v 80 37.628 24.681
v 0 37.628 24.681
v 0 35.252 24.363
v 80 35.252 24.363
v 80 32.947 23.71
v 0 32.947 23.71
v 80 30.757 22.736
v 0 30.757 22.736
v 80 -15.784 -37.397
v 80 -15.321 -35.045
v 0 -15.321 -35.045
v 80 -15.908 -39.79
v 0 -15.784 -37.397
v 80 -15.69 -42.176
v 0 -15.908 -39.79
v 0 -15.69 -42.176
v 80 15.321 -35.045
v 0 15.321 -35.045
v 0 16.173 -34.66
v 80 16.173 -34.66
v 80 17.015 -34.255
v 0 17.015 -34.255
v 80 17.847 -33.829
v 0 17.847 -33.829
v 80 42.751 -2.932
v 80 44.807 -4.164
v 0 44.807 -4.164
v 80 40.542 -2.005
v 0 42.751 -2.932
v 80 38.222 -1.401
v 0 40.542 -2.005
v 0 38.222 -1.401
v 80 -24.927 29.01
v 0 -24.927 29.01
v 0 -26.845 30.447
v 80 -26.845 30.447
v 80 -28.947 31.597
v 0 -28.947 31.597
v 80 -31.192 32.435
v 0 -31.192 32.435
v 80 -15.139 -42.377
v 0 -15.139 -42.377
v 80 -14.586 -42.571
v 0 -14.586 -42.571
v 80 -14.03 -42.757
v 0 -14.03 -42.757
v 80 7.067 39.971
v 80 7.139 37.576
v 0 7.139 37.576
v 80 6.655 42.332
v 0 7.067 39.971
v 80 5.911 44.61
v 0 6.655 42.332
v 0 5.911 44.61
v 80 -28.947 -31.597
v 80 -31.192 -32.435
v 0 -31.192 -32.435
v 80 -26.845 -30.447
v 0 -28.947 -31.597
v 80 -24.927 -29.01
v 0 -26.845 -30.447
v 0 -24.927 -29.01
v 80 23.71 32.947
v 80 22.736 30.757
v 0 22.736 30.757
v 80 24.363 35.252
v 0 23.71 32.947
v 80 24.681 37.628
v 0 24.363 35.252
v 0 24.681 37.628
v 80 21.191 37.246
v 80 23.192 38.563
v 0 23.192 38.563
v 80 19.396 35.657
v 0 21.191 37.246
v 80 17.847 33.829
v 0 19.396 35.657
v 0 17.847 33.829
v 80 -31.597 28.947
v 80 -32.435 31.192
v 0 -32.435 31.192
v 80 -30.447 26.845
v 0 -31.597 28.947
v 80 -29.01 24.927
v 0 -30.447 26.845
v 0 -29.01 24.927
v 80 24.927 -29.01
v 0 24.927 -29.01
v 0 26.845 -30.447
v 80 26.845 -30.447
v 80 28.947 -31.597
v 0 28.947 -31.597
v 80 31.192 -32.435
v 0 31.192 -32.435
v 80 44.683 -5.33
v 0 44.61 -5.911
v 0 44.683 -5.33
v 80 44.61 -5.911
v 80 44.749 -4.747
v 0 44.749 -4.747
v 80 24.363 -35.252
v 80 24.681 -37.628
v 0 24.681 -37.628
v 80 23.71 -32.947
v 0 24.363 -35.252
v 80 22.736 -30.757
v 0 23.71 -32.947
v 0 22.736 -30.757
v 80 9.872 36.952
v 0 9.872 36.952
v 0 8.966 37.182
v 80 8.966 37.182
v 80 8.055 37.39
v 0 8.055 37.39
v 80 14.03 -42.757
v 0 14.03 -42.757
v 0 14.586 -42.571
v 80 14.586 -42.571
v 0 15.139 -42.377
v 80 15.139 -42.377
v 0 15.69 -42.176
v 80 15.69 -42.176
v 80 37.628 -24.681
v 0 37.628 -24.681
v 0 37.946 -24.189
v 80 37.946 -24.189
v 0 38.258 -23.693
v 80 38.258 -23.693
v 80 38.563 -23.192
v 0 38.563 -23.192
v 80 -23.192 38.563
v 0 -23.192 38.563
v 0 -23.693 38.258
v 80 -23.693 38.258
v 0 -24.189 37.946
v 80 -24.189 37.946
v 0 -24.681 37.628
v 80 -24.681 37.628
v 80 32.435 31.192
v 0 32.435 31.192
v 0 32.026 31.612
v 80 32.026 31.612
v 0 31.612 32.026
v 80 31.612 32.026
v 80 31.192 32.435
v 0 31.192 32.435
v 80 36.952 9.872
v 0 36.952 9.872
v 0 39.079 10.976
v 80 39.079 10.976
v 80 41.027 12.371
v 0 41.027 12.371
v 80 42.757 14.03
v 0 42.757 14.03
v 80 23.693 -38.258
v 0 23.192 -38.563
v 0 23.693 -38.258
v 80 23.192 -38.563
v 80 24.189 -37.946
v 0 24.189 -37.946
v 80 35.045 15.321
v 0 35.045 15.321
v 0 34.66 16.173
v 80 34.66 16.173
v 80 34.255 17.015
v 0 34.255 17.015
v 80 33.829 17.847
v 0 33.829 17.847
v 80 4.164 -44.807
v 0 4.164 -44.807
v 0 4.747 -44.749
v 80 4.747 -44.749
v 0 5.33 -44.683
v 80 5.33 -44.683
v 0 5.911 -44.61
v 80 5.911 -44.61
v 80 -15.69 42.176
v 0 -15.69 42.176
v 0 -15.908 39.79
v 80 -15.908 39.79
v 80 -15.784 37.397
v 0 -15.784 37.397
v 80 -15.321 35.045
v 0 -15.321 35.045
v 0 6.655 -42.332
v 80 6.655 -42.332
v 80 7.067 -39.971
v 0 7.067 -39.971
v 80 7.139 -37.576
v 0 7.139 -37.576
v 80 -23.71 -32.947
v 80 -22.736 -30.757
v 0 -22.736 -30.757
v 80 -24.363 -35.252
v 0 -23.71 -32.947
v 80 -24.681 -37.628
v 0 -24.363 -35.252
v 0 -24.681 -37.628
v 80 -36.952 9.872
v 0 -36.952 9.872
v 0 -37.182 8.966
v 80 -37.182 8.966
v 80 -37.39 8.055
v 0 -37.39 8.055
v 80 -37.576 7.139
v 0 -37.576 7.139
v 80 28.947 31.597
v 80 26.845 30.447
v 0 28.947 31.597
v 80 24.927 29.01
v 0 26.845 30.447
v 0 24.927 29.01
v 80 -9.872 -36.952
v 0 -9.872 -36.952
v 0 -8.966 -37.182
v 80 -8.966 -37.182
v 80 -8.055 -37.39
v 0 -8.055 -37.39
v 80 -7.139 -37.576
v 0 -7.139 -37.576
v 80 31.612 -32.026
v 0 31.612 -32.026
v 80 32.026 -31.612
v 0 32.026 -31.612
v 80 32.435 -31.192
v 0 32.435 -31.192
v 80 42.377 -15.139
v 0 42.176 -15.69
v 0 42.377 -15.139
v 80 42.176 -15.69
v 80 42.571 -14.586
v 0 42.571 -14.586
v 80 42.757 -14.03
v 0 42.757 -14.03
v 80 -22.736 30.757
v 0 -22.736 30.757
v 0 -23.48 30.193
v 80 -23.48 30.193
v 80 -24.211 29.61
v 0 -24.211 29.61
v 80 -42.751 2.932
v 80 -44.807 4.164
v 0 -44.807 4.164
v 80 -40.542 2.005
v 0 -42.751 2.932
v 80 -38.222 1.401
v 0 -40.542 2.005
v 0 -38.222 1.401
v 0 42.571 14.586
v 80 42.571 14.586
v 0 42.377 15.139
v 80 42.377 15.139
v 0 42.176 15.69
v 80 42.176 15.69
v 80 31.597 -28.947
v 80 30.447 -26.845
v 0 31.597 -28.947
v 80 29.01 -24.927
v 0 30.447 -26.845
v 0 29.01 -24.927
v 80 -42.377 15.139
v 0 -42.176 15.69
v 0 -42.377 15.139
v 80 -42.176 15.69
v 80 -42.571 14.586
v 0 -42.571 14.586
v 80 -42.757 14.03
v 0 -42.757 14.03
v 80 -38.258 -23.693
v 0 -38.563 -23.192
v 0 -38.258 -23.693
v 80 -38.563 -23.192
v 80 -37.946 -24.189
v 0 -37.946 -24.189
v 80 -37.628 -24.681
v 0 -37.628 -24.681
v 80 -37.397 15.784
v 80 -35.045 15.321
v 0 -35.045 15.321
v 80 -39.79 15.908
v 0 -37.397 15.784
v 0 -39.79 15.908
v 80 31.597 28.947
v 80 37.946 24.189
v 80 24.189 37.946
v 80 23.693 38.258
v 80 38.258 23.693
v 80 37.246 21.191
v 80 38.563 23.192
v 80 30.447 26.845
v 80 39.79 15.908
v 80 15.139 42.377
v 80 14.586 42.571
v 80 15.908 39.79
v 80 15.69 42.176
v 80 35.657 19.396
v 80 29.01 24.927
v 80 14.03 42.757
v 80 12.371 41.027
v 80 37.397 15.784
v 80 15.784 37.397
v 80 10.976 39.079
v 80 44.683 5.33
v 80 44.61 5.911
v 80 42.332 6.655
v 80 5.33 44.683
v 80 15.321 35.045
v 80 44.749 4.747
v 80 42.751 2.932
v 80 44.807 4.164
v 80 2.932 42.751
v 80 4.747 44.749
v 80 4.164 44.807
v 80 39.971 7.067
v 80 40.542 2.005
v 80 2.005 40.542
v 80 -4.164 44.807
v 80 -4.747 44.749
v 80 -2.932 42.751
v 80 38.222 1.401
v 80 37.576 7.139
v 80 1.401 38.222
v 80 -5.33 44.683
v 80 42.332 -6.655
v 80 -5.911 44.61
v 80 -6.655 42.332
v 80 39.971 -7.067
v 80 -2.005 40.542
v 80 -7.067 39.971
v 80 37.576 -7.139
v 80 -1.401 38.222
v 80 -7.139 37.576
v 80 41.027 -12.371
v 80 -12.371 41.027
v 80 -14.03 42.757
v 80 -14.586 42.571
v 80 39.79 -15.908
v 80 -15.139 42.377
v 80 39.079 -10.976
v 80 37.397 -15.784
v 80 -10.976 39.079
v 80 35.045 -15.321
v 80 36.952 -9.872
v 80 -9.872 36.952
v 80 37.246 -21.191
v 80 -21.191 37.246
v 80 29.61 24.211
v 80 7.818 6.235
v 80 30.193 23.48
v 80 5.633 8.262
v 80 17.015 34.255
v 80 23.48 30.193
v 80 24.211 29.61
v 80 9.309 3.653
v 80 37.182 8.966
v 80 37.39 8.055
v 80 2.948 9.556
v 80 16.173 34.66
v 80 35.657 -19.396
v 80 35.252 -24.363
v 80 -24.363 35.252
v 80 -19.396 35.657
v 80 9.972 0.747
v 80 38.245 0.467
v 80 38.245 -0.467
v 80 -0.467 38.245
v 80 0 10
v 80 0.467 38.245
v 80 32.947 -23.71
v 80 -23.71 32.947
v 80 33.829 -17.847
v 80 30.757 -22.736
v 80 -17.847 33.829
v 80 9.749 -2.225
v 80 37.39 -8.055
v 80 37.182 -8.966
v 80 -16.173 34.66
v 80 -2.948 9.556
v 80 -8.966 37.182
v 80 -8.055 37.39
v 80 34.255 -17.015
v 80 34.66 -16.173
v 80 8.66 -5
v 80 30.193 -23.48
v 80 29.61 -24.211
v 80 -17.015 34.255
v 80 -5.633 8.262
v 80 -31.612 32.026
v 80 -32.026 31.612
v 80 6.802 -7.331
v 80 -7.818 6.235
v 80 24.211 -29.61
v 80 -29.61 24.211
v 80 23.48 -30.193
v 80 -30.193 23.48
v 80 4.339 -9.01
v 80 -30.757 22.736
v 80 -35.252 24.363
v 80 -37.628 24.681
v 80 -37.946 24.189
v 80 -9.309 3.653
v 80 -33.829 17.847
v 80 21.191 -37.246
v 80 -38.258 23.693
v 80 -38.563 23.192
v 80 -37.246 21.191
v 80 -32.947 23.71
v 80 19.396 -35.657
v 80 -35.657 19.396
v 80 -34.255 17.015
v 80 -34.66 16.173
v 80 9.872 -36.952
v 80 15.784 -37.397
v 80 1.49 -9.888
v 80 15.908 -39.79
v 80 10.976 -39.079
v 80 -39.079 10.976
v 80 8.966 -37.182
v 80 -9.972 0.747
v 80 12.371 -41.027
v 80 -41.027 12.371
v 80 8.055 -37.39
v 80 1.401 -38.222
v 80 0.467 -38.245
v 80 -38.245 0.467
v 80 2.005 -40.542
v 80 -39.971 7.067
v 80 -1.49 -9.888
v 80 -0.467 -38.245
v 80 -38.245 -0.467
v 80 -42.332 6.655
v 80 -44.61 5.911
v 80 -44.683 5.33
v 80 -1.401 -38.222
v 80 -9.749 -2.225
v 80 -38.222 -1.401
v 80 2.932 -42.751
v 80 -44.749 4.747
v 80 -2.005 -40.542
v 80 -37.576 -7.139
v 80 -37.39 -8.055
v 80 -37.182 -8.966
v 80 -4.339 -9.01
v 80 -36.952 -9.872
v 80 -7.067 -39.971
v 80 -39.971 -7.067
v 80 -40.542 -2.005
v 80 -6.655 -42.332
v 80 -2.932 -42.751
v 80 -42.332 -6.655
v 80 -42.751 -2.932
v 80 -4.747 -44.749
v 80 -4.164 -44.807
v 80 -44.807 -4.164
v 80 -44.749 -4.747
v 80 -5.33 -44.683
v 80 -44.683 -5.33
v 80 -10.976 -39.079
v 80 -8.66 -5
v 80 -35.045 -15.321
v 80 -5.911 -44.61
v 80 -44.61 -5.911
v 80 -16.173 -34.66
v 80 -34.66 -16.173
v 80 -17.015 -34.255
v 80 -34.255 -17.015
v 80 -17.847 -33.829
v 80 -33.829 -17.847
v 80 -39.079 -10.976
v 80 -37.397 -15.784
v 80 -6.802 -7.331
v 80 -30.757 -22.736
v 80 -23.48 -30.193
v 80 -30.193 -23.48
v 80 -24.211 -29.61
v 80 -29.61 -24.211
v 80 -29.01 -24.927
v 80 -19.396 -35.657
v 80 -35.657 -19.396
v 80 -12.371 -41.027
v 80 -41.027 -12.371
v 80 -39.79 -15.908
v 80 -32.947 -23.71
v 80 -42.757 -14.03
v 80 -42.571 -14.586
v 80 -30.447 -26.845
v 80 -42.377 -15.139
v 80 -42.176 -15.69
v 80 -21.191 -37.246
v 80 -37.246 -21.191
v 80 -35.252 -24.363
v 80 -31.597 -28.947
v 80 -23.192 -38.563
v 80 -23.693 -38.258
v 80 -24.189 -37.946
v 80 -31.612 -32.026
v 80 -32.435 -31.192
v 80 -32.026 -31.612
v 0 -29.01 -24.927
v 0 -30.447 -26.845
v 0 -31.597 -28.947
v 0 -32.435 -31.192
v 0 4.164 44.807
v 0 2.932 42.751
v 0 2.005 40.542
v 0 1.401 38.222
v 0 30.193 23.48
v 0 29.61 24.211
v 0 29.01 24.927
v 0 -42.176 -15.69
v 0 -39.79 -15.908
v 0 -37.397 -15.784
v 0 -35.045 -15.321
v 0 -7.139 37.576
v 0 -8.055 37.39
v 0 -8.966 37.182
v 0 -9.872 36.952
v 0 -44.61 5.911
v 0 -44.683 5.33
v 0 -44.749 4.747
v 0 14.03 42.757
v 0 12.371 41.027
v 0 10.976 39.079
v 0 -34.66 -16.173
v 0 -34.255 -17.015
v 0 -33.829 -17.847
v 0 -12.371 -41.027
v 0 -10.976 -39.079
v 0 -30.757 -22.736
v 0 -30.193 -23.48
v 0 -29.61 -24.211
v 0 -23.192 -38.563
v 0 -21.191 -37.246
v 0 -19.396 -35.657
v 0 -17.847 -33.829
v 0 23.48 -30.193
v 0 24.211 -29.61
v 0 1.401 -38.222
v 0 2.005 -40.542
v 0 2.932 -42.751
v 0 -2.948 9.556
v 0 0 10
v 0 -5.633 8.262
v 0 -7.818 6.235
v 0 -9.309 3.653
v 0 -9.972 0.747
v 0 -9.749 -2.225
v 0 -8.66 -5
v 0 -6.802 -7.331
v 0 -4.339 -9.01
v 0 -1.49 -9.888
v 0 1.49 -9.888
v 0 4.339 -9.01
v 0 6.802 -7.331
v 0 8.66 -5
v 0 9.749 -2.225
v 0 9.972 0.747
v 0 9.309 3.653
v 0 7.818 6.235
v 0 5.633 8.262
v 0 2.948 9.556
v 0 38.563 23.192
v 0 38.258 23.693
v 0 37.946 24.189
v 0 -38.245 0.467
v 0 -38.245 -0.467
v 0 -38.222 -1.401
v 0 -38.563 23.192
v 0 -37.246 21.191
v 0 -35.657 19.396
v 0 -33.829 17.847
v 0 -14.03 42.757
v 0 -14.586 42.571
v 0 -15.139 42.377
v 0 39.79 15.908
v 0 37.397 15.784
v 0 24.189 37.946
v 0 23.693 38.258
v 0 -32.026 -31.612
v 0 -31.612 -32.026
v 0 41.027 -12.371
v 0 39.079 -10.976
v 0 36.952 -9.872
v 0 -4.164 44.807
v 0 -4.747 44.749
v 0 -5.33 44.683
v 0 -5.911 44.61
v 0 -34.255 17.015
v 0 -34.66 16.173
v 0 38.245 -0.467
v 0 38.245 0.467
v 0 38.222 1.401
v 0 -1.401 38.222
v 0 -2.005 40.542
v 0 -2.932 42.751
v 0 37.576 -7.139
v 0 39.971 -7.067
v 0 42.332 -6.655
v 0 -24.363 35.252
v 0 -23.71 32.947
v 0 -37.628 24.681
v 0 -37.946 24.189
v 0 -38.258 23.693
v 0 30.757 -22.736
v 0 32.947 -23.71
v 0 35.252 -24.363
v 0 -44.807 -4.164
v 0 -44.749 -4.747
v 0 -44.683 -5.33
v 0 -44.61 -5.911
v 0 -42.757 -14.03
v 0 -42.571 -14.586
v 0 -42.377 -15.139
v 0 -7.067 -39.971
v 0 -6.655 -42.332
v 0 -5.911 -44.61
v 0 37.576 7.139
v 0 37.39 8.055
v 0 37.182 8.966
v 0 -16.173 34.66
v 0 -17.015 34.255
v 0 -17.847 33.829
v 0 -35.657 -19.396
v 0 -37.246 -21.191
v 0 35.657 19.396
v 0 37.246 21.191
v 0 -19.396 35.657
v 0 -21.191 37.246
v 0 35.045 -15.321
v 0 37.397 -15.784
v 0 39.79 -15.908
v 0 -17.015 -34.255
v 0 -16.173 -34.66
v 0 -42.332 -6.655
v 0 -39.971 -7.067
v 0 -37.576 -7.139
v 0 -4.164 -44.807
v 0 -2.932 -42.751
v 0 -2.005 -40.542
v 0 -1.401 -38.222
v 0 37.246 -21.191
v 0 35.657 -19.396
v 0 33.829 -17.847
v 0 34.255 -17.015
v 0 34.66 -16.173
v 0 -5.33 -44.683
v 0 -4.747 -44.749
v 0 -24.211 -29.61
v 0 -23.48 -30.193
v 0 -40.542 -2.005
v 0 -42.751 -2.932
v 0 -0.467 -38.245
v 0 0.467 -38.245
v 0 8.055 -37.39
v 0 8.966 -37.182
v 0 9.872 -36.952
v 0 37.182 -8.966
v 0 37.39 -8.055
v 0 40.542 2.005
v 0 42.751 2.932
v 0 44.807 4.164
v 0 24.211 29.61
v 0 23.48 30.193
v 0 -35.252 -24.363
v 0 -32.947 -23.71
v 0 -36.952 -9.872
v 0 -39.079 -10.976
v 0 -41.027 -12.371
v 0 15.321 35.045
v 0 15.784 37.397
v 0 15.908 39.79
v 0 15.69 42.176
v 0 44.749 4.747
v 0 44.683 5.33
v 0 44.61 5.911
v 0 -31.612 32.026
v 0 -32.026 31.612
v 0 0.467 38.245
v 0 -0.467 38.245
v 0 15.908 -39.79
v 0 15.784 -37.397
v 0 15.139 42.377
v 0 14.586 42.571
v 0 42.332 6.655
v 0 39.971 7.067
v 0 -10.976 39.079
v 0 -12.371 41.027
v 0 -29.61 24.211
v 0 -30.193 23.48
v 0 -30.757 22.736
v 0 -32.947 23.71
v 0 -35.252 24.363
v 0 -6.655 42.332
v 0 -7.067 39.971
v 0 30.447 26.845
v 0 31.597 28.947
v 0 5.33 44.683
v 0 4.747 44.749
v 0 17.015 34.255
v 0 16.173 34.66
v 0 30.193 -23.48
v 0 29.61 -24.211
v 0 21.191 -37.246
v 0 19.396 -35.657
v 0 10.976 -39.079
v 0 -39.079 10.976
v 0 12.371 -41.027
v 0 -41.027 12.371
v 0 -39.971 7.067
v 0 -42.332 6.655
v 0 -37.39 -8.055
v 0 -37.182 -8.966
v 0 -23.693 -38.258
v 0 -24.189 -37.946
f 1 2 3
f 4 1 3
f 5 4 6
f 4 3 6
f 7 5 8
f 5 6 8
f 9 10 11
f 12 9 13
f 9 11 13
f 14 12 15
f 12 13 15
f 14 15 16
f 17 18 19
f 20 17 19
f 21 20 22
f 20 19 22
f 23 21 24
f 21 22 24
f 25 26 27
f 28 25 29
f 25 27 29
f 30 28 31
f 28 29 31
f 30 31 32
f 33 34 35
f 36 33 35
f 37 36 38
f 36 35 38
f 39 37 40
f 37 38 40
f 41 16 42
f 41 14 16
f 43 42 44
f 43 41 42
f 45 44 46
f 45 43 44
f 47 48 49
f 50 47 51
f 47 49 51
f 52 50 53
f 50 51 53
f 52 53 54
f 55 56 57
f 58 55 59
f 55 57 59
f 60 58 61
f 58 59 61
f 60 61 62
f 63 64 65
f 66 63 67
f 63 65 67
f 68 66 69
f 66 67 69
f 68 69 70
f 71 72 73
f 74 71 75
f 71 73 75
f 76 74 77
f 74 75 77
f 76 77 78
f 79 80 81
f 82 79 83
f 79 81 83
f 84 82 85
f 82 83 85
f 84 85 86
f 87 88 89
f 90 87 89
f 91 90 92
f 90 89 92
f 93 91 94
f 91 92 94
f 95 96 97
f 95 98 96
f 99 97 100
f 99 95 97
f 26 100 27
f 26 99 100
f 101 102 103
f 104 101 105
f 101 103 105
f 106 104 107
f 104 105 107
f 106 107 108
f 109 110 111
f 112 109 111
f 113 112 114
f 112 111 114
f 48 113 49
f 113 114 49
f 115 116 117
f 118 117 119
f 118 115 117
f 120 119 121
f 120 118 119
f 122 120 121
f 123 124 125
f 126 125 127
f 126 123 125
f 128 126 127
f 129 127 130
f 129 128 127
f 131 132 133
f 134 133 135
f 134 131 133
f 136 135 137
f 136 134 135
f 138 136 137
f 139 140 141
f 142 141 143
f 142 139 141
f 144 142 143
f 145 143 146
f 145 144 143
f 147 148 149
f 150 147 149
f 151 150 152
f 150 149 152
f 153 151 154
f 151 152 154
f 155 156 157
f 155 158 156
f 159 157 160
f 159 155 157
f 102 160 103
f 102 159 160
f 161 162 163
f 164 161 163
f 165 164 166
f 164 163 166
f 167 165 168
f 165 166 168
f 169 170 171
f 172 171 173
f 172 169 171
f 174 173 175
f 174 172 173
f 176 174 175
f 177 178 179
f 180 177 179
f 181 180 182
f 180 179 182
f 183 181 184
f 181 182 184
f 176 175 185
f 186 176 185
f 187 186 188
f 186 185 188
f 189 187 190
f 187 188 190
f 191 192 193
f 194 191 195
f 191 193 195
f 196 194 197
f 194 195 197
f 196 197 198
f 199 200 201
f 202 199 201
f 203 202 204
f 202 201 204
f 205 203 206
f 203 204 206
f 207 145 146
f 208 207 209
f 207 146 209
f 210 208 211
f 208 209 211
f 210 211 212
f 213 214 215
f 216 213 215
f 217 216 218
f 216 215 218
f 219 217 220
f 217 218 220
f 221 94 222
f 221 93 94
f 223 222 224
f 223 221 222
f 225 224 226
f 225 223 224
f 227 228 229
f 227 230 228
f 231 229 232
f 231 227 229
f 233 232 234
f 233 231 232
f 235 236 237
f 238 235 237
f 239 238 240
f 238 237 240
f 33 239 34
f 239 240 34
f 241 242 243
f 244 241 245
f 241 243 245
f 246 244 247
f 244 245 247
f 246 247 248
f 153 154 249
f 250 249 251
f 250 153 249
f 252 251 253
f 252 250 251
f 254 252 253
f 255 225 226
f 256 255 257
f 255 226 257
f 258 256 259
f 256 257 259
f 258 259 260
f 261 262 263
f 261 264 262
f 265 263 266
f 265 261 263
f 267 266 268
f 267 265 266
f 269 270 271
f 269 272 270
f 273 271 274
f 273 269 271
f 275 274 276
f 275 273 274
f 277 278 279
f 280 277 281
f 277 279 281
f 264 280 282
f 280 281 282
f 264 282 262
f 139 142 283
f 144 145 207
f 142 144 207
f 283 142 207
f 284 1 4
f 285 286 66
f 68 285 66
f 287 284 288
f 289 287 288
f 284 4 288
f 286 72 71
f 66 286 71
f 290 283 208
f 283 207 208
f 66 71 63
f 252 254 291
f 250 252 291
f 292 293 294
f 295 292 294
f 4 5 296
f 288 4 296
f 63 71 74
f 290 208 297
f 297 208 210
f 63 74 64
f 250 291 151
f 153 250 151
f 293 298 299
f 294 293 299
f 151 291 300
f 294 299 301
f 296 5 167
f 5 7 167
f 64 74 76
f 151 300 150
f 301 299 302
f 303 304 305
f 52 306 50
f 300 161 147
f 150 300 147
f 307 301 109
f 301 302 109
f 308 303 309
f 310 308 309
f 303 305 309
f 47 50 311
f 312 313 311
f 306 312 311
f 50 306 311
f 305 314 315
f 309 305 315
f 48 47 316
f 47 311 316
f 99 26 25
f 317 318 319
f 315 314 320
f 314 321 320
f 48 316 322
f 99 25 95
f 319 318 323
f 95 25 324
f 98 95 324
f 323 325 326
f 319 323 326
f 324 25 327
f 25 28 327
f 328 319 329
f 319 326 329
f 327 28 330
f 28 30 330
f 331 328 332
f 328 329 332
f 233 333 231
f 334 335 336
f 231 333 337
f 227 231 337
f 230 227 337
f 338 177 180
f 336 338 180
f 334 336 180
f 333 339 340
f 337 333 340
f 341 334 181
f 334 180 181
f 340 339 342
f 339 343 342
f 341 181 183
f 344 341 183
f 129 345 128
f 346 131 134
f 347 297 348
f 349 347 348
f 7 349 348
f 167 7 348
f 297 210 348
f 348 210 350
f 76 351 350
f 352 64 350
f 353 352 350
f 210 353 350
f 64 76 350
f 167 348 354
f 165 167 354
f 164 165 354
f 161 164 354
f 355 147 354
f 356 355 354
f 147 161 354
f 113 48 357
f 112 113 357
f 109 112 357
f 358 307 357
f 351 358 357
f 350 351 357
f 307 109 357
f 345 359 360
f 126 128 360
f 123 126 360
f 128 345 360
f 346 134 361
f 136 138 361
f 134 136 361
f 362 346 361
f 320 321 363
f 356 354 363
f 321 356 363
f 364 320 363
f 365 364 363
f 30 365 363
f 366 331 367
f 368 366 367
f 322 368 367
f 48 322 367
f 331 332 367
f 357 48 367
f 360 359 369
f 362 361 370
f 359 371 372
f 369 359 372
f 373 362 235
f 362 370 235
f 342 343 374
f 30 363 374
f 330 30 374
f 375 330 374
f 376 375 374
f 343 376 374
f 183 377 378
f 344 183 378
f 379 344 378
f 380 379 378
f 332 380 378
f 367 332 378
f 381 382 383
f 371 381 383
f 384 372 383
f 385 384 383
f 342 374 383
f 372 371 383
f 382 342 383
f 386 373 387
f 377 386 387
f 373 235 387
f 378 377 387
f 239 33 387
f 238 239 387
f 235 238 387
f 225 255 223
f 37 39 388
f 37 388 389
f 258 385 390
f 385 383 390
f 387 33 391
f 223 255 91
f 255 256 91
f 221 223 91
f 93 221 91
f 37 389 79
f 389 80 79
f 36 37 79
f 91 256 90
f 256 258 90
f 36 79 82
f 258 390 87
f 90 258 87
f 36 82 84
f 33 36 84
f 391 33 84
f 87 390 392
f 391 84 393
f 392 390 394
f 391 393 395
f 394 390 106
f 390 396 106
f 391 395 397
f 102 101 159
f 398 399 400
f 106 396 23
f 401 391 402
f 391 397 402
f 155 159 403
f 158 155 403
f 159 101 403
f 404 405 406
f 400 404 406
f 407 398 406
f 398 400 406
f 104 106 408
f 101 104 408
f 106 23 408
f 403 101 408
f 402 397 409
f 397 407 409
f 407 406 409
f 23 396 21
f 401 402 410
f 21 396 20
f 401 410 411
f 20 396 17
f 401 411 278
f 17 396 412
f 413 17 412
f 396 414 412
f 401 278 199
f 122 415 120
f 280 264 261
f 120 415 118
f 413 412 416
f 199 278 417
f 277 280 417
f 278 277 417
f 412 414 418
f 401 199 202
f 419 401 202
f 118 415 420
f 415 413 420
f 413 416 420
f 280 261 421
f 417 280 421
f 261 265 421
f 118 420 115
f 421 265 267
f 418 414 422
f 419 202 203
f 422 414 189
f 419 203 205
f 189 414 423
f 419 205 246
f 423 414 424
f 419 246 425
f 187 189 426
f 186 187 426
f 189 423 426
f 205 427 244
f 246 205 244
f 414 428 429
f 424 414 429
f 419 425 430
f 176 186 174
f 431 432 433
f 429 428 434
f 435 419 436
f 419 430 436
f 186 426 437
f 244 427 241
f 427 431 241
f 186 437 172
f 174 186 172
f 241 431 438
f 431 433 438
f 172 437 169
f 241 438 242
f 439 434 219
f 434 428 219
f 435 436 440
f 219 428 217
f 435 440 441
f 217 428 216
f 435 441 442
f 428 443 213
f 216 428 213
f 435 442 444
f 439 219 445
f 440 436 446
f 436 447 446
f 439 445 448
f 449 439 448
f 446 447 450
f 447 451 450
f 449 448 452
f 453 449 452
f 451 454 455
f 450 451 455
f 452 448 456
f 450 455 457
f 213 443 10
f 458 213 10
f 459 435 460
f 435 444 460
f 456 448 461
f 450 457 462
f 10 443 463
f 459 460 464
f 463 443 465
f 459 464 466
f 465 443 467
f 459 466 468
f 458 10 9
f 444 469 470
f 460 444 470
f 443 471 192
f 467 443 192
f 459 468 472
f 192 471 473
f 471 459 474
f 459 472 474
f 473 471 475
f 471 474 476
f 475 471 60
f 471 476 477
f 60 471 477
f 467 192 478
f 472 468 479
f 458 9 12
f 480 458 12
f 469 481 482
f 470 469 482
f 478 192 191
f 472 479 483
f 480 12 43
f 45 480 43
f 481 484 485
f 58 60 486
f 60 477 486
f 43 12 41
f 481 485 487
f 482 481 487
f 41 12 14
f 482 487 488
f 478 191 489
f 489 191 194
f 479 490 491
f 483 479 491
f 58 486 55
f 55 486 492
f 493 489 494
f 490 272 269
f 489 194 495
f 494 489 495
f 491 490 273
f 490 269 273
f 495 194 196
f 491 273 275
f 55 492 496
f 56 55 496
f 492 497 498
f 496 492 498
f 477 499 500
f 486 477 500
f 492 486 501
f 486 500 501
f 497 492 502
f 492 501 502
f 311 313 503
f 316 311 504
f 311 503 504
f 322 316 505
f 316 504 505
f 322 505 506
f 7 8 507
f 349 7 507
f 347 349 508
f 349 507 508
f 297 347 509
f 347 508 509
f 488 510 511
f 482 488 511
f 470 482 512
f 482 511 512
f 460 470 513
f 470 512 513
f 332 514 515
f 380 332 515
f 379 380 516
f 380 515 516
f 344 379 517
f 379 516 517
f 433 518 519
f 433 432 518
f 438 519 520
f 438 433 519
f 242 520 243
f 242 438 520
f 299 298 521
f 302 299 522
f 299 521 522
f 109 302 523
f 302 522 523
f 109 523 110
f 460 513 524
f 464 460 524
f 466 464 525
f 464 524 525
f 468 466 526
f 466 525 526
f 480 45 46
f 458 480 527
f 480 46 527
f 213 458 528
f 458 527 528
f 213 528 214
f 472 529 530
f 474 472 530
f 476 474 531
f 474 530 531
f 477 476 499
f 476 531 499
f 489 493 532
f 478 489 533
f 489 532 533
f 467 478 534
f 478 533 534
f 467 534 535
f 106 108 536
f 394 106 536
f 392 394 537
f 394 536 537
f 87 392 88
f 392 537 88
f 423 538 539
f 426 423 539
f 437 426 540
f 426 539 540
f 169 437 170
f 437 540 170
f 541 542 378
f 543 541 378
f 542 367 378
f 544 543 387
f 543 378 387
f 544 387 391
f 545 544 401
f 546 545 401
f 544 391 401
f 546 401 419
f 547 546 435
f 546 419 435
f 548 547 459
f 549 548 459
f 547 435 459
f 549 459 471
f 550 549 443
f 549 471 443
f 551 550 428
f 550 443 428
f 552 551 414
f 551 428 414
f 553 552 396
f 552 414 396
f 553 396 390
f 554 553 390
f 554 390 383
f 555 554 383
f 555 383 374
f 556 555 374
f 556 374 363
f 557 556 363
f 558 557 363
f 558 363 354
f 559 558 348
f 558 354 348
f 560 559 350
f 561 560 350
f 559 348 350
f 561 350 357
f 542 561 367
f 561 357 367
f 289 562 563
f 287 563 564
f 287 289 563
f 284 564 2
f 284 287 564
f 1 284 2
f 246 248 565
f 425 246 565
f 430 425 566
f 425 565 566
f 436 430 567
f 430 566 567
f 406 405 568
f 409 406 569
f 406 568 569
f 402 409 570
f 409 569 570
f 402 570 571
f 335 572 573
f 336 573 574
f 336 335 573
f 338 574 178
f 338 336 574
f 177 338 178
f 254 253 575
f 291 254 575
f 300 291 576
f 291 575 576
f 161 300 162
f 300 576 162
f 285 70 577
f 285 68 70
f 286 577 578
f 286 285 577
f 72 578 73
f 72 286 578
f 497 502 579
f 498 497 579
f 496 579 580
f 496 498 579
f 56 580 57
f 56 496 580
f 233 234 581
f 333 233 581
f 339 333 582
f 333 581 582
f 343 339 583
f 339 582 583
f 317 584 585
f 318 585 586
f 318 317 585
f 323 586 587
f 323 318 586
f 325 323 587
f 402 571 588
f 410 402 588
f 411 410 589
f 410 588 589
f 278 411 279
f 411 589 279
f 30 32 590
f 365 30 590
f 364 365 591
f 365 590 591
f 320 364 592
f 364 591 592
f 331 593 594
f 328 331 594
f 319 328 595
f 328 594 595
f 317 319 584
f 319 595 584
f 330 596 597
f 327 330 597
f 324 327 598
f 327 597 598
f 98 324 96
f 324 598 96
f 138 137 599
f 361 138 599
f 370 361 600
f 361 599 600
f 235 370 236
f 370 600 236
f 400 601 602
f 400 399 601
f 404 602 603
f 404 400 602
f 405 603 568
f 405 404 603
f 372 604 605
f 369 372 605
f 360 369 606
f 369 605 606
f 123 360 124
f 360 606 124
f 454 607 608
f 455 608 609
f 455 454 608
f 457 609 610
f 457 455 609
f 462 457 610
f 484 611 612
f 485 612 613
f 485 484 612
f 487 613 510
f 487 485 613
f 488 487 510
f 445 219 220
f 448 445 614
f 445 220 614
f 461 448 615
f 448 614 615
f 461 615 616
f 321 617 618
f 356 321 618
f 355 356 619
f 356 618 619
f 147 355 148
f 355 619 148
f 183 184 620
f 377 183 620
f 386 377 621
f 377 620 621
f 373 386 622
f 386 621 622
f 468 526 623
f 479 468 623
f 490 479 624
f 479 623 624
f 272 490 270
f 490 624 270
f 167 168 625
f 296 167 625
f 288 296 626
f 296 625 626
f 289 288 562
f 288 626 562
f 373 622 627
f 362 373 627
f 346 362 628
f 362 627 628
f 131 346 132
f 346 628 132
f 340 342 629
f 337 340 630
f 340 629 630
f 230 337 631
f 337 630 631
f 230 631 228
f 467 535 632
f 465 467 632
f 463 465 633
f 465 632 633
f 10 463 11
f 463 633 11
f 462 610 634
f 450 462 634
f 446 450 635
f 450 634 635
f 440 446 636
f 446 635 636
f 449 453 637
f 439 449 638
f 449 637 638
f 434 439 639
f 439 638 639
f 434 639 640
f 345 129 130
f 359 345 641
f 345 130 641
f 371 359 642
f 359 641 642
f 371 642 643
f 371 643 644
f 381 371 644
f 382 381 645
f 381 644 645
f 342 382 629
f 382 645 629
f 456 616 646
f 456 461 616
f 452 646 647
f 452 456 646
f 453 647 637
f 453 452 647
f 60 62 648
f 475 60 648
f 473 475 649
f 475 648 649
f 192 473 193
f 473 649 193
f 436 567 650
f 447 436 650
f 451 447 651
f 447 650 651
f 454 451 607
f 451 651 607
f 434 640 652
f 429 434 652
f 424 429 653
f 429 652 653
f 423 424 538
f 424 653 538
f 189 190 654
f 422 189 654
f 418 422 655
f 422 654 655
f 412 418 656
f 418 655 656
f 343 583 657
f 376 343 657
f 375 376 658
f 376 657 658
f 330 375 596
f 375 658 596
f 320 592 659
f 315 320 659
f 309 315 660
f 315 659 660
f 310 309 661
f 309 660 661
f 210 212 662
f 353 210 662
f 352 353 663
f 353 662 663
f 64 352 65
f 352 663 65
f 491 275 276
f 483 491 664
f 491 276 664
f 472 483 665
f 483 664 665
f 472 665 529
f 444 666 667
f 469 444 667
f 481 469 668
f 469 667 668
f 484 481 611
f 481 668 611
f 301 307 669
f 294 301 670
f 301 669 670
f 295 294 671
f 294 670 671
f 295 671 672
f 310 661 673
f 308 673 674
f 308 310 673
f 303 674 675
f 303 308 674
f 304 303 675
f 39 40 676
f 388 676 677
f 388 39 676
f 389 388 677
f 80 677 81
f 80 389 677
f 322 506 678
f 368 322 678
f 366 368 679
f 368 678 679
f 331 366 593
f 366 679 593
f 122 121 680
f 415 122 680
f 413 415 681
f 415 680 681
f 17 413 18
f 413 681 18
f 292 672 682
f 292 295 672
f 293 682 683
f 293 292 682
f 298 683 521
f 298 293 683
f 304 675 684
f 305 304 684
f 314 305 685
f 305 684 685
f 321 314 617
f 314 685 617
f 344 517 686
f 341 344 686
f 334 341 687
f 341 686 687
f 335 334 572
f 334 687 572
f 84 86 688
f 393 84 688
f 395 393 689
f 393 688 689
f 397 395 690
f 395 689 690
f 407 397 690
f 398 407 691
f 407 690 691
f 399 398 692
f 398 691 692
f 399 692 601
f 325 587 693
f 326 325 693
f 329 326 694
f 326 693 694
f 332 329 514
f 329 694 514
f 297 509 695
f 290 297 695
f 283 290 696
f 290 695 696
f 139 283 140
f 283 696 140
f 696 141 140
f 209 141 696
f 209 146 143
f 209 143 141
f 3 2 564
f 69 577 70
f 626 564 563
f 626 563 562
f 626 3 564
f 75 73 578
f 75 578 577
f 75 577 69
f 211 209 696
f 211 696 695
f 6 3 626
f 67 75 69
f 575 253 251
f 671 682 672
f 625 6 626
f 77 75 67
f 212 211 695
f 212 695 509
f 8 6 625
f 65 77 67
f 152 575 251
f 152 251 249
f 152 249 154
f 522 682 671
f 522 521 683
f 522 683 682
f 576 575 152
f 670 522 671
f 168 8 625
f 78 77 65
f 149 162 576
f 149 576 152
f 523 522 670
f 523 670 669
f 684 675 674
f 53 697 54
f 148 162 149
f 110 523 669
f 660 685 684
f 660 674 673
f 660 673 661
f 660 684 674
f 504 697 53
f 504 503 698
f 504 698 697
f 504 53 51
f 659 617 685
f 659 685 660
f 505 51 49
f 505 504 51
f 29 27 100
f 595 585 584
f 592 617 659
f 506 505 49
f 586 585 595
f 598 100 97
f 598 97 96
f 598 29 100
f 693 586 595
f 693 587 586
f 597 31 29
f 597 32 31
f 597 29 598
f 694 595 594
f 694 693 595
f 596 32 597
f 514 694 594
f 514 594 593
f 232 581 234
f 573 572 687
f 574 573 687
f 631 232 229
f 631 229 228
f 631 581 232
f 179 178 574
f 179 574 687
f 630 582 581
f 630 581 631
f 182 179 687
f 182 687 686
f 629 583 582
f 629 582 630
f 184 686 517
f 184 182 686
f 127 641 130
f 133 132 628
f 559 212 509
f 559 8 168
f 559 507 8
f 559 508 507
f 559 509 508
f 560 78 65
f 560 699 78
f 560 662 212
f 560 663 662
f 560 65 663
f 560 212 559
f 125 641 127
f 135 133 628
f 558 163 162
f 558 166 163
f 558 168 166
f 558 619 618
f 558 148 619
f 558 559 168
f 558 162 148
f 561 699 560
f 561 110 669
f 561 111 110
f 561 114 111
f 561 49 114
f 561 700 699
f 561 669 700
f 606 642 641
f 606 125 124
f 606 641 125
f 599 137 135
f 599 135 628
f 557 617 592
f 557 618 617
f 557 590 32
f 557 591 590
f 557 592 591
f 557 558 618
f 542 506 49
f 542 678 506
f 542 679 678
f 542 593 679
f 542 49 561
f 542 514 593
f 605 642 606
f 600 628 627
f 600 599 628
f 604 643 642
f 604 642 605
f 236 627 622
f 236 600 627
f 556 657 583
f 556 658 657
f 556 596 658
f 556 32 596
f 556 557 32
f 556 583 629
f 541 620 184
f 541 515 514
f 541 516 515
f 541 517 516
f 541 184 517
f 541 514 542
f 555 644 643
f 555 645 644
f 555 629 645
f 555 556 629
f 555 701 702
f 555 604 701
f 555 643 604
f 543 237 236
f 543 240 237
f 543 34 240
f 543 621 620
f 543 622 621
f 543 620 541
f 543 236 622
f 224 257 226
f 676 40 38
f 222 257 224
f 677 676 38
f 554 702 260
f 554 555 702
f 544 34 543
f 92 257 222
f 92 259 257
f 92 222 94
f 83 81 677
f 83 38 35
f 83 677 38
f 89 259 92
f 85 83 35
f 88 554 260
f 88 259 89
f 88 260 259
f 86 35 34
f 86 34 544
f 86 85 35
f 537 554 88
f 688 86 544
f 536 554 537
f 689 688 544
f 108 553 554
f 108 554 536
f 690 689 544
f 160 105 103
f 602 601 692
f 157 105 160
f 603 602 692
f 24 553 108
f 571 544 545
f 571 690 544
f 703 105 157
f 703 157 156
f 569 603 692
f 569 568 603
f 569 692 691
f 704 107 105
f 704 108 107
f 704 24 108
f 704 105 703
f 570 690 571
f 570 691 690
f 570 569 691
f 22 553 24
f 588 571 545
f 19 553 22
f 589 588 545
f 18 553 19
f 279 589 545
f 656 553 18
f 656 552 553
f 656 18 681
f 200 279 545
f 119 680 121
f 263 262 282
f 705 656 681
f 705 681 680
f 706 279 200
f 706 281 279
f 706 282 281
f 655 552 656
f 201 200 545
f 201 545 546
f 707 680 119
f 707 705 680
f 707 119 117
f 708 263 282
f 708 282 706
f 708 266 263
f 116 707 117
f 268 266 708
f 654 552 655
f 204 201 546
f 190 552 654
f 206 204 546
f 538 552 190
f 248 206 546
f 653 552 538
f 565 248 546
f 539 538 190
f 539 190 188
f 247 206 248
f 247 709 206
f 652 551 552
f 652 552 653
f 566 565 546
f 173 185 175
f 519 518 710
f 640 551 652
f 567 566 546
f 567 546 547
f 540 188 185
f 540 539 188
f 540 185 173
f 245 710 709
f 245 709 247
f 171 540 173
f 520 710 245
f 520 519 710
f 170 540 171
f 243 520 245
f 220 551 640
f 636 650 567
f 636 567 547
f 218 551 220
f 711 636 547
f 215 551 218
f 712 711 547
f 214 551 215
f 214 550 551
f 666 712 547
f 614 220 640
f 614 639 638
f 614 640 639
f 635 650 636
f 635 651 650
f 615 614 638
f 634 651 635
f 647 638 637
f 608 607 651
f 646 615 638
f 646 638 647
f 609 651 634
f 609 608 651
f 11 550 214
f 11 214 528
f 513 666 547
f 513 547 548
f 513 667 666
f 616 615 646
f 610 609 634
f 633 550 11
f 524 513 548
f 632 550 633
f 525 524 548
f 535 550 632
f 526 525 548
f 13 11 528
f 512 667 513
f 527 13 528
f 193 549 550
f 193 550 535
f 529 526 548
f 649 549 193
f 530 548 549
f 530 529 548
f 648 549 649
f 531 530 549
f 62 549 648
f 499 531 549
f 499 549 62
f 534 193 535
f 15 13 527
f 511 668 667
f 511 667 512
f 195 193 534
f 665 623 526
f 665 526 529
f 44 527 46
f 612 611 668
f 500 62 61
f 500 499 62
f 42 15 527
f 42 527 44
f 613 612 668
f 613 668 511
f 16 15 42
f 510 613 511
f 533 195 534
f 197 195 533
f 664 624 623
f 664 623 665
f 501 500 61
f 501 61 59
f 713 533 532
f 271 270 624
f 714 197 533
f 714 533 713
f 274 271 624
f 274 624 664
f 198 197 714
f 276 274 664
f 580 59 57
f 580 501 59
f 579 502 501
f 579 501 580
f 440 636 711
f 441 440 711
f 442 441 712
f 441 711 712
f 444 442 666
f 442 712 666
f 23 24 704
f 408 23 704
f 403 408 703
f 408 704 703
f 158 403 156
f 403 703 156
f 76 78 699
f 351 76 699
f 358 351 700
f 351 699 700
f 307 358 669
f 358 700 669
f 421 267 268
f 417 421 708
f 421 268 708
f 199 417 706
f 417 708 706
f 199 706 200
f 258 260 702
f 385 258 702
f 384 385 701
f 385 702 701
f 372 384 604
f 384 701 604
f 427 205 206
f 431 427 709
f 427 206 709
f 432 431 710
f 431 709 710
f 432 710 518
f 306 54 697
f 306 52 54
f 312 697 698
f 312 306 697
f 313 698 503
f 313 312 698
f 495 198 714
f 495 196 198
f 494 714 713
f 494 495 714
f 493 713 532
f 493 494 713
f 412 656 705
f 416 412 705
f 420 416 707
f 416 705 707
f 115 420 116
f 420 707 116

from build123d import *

# Parameters (mm, degrees)
BASPROSKE_W     = 40
BASPROSKE_H     = 22.5
TOOTHCUT_DEPTH  = 52.112620751
TEETHCUTS_COUNT = 28
TEETHCUTS_ANGLE = 347.142857143
BORSKE_R        = 5
BORE_DEPTH      = 50.0000508
SCALE1_SCALE    = 2


with BuildPart() as part:
    # BasProSke → Base-Revolve (revolve)
    with BuildSketch(Plane(origin=(0, 0, 0), x_dir=(1, 0, 0), z_dir=(0, 1, 0)), mode=Mode.PRIVATE) as base_revolve_sk:
        with Locations((20, 11.25)):
            Rectangle(BASPROSKE_W, BASPROSKE_H)
    revolve(base_revolve_sk.sketch.rotate(Axis((-10, 0, 0), (1, 0, 0)), 180), axis=Axis((-10, 0, 0), (1, 0, 0)))

    # TooCutSke → ToothCut (cut, through all)
    with BuildSketch(Plane(origin=(0, 0, 0), x_dir=(0, 0, -1), z_dir=(1, 0, 0))):
        with BuildLine():
            ThreePointArc((0.70071741, 19.111158288), (0, 19.124), (-0.70071741, 19.111158288))
            ThreePointArc((-0.70071741, 19.111158288), (-1.220048441, 20.845037035), (-2.098754998, 22.427413418))
            ThreePointArc((-2.098754998, 22.427413418), (0, 22.5254), (2.098754998, 22.427413418))
            ThreePointArc((2.098754998, 22.427413418), (1.220048441, 20.845037035), (0.70071741, 19.111158288))
        make_face()
    toothcut = extrude(amount=TOOTHCUT_DEPTH, mode=Mode.SUBTRACT)

    # TeethCuts: ToothCut ×28 about axis
    teethcuts_axis = Axis((-10, 0, 0), (1, 0, 0))
    for i in range(1, TEETHCUTS_COUNT):
        add(toothcut.rotate(teethcuts_axis, i * TEETHCUTS_ANGLE / (TEETHCUTS_COUNT - 1)), mode=Mode.SUBTRACT)

    # BorSke → Bore (cut, symmetric)
    with BuildSketch(Plane(origin=(0, 0, 0), x_dir=(0, 0, -1), z_dir=(1, 0, 0))):
        with Locations(Location((0, 0, 0), (0, 0, 180))):
            Circle(BORSKE_R)
    extrude(amount=BORE_DEPTH, both=True, mode=Mode.SUBTRACT)


with BuildPart() as part_1:
    # Scale1: scaled about (0, 0, 0)
    add(part.part.scale(SCALE1_SCALE))


solid = part_1.part
